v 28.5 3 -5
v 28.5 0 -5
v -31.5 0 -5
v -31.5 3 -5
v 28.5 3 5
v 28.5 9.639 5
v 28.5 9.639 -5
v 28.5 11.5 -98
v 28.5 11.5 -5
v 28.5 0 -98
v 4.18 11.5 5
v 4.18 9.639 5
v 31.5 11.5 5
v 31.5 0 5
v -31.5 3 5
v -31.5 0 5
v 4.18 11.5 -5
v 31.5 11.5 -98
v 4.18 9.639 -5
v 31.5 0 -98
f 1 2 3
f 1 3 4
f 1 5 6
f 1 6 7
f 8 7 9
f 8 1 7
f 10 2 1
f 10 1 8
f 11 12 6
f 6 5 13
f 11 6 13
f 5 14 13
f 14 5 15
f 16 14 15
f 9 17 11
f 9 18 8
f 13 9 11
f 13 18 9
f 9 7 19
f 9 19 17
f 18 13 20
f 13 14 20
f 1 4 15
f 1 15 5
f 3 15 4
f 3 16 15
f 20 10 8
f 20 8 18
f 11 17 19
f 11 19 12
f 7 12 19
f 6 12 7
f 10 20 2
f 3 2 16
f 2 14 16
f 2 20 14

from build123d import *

# Parameters (mm, degrees)
SKETCH_1_W          = 63
SKETCH_1_H          = 10
EXTRUDE_1_DEPTH     = 2
SKETCH_4_W          = 2
SKETCH_4_H          = 10
EXTRUDE_2_DEPTH     = 93
SKETCH_5_W          = 61
SKETCH_5_H          = 10
EXTRUDE_3_DEPTH     = 1
SKETCH_6_W          = 10
SKETCH_6_H          = 92
EXTRUDE_4_DEPTH     = 1
SKETCH_7_W          = 3
SKETCH_7_H          = 10
EXTRUDE_5_DEPTH     = 93
SKETCH_10_W         = 26.594312394
SKETCH_10_H         = 101.559656513
CUT_EXTRUDE_1_DEPTH = 93
SKETCH_11_W         = 3
SKETCH_11_H         = 103
EXTRUDE_6_DEPTH     = 1.5
SKETCH_12_W         = 10
SKETCH_12_H         = 3.861283188
EXTRUDE_7_DEPTH     = 20.32
SKETCH_13_W         = 10
SKETCH_13_H         = 3.861283188
EXTRUDE_8_DEPTH     = 4
SKETCH_14_W         = 24.32
SKETCH_14_H         = 10
CUT_EXTRUDE_2_DEPTH = 2


with BuildPart() as part:
    # 草图1 → 凸台-拉伸1 (new body)
    with BuildSketch(Plane(origin=(0, 0, 0), x_dir=(1, 0, 0), z_dir=(0, 1, 0))):
        Rectangle(SKETCH_1_W, SKETCH_1_H)
    extrude(amount=EXTRUDE_1_DEPTH)

    # 草图4 → 凸台-拉伸2 (add)
    with BuildSketch(Plane(origin=(0, 2, 0), x_dir=(1, 0, 0), z_dir=(0, 1, 0))):
        with Locations((30.5, 0)):
            Rectangle(SKETCH_4_W, SKETCH_4_H)
    extrude(amount=EXTRUDE_2_DEPTH)

    # 草图5 → 凸台-拉伸3 (add)
    with BuildSketch(Plane(origin=(0, 2, 0), x_dir=(1, 0, 0), z_dir=(0, 1, 0))):
        with Locations((-1, 0)):
            Rectangle(SKETCH_5_W, SKETCH_5_H)
    extrude(amount=EXTRUDE_3_DEPTH)

    # 草图6 → 凸台-拉伸4 (add)
    with BuildSketch(Plane.ZY.offset(-29.5)):
        with Locations((0, 49)):
            Rectangle(SKETCH_6_W, SKETCH_6_H)
    extrude(amount=EXTRUDE_4_DEPTH)

    # 草图7 → 凸台-拉伸5 (add)
    with BuildSketch(Plane(origin=(0, 0, -5), x_dir=(-1, 0, 0), z_dir=(0, 0, -1))):
        with Locations((-30, 5)):
            Rectangle(SKETCH_7_W, SKETCH_7_H)
    extrude(amount=EXTRUDE_5_DEPTH)

    # 草图10 → 切除-拉伸1 (cut)
    with BuildSketch(Plane.ZY.offset(-28.5)):
        with Locations((8.297156197, 60.779828257)):
            Rectangle(SKETCH_10_W, SKETCH_10_H)
    extrude(amount=-CUT_EXTRUDE_1_DEPTH, mode=Mode.SUBTRACT)

    # 草图11 → 凸台-拉伸6 (add)
    with BuildSketch(Plane(origin=(0, 10, 0), x_dir=(1, 0, 0), z_dir=(0, 1, 0))):
        with Locations((30, 46.5)):
            Rectangle(SKETCH_11_W, SKETCH_11_H)
    extrude(amount=EXTRUDE_6_DEPTH)

    # 草图12 → 凸台-拉伸7 (add)
    with BuildSketch(Plane.ZY.offset(-28.5)):
        with Locations((0, 9.569358406)):
            Rectangle(SKETCH_12_W, SKETCH_12_H)
    extrude(amount=EXTRUDE_7_DEPTH)

    # 草图13 → 凸台-拉伸8 (add)
    with BuildSketch(Plane.ZY.offset(-8.18)):
        with Locations((0, 9.569358406)):
            Rectangle(SKETCH_13_W, SKETCH_13_H)
    extrude(amount=EXTRUDE_8_DEPTH)

    # 草图14 → 切除-拉伸2 (cut)
    with BuildSketch(Plane.XZ.offset(-7.638716812)):
        with Locations((16.34, 0)):
            Rectangle(SKETCH_14_W, SKETCH_14_H)
    extrude(amount=-CUT_EXTRUDE_2_DEPTH, mode=Mode.SUBTRACT)


solid = part.part
